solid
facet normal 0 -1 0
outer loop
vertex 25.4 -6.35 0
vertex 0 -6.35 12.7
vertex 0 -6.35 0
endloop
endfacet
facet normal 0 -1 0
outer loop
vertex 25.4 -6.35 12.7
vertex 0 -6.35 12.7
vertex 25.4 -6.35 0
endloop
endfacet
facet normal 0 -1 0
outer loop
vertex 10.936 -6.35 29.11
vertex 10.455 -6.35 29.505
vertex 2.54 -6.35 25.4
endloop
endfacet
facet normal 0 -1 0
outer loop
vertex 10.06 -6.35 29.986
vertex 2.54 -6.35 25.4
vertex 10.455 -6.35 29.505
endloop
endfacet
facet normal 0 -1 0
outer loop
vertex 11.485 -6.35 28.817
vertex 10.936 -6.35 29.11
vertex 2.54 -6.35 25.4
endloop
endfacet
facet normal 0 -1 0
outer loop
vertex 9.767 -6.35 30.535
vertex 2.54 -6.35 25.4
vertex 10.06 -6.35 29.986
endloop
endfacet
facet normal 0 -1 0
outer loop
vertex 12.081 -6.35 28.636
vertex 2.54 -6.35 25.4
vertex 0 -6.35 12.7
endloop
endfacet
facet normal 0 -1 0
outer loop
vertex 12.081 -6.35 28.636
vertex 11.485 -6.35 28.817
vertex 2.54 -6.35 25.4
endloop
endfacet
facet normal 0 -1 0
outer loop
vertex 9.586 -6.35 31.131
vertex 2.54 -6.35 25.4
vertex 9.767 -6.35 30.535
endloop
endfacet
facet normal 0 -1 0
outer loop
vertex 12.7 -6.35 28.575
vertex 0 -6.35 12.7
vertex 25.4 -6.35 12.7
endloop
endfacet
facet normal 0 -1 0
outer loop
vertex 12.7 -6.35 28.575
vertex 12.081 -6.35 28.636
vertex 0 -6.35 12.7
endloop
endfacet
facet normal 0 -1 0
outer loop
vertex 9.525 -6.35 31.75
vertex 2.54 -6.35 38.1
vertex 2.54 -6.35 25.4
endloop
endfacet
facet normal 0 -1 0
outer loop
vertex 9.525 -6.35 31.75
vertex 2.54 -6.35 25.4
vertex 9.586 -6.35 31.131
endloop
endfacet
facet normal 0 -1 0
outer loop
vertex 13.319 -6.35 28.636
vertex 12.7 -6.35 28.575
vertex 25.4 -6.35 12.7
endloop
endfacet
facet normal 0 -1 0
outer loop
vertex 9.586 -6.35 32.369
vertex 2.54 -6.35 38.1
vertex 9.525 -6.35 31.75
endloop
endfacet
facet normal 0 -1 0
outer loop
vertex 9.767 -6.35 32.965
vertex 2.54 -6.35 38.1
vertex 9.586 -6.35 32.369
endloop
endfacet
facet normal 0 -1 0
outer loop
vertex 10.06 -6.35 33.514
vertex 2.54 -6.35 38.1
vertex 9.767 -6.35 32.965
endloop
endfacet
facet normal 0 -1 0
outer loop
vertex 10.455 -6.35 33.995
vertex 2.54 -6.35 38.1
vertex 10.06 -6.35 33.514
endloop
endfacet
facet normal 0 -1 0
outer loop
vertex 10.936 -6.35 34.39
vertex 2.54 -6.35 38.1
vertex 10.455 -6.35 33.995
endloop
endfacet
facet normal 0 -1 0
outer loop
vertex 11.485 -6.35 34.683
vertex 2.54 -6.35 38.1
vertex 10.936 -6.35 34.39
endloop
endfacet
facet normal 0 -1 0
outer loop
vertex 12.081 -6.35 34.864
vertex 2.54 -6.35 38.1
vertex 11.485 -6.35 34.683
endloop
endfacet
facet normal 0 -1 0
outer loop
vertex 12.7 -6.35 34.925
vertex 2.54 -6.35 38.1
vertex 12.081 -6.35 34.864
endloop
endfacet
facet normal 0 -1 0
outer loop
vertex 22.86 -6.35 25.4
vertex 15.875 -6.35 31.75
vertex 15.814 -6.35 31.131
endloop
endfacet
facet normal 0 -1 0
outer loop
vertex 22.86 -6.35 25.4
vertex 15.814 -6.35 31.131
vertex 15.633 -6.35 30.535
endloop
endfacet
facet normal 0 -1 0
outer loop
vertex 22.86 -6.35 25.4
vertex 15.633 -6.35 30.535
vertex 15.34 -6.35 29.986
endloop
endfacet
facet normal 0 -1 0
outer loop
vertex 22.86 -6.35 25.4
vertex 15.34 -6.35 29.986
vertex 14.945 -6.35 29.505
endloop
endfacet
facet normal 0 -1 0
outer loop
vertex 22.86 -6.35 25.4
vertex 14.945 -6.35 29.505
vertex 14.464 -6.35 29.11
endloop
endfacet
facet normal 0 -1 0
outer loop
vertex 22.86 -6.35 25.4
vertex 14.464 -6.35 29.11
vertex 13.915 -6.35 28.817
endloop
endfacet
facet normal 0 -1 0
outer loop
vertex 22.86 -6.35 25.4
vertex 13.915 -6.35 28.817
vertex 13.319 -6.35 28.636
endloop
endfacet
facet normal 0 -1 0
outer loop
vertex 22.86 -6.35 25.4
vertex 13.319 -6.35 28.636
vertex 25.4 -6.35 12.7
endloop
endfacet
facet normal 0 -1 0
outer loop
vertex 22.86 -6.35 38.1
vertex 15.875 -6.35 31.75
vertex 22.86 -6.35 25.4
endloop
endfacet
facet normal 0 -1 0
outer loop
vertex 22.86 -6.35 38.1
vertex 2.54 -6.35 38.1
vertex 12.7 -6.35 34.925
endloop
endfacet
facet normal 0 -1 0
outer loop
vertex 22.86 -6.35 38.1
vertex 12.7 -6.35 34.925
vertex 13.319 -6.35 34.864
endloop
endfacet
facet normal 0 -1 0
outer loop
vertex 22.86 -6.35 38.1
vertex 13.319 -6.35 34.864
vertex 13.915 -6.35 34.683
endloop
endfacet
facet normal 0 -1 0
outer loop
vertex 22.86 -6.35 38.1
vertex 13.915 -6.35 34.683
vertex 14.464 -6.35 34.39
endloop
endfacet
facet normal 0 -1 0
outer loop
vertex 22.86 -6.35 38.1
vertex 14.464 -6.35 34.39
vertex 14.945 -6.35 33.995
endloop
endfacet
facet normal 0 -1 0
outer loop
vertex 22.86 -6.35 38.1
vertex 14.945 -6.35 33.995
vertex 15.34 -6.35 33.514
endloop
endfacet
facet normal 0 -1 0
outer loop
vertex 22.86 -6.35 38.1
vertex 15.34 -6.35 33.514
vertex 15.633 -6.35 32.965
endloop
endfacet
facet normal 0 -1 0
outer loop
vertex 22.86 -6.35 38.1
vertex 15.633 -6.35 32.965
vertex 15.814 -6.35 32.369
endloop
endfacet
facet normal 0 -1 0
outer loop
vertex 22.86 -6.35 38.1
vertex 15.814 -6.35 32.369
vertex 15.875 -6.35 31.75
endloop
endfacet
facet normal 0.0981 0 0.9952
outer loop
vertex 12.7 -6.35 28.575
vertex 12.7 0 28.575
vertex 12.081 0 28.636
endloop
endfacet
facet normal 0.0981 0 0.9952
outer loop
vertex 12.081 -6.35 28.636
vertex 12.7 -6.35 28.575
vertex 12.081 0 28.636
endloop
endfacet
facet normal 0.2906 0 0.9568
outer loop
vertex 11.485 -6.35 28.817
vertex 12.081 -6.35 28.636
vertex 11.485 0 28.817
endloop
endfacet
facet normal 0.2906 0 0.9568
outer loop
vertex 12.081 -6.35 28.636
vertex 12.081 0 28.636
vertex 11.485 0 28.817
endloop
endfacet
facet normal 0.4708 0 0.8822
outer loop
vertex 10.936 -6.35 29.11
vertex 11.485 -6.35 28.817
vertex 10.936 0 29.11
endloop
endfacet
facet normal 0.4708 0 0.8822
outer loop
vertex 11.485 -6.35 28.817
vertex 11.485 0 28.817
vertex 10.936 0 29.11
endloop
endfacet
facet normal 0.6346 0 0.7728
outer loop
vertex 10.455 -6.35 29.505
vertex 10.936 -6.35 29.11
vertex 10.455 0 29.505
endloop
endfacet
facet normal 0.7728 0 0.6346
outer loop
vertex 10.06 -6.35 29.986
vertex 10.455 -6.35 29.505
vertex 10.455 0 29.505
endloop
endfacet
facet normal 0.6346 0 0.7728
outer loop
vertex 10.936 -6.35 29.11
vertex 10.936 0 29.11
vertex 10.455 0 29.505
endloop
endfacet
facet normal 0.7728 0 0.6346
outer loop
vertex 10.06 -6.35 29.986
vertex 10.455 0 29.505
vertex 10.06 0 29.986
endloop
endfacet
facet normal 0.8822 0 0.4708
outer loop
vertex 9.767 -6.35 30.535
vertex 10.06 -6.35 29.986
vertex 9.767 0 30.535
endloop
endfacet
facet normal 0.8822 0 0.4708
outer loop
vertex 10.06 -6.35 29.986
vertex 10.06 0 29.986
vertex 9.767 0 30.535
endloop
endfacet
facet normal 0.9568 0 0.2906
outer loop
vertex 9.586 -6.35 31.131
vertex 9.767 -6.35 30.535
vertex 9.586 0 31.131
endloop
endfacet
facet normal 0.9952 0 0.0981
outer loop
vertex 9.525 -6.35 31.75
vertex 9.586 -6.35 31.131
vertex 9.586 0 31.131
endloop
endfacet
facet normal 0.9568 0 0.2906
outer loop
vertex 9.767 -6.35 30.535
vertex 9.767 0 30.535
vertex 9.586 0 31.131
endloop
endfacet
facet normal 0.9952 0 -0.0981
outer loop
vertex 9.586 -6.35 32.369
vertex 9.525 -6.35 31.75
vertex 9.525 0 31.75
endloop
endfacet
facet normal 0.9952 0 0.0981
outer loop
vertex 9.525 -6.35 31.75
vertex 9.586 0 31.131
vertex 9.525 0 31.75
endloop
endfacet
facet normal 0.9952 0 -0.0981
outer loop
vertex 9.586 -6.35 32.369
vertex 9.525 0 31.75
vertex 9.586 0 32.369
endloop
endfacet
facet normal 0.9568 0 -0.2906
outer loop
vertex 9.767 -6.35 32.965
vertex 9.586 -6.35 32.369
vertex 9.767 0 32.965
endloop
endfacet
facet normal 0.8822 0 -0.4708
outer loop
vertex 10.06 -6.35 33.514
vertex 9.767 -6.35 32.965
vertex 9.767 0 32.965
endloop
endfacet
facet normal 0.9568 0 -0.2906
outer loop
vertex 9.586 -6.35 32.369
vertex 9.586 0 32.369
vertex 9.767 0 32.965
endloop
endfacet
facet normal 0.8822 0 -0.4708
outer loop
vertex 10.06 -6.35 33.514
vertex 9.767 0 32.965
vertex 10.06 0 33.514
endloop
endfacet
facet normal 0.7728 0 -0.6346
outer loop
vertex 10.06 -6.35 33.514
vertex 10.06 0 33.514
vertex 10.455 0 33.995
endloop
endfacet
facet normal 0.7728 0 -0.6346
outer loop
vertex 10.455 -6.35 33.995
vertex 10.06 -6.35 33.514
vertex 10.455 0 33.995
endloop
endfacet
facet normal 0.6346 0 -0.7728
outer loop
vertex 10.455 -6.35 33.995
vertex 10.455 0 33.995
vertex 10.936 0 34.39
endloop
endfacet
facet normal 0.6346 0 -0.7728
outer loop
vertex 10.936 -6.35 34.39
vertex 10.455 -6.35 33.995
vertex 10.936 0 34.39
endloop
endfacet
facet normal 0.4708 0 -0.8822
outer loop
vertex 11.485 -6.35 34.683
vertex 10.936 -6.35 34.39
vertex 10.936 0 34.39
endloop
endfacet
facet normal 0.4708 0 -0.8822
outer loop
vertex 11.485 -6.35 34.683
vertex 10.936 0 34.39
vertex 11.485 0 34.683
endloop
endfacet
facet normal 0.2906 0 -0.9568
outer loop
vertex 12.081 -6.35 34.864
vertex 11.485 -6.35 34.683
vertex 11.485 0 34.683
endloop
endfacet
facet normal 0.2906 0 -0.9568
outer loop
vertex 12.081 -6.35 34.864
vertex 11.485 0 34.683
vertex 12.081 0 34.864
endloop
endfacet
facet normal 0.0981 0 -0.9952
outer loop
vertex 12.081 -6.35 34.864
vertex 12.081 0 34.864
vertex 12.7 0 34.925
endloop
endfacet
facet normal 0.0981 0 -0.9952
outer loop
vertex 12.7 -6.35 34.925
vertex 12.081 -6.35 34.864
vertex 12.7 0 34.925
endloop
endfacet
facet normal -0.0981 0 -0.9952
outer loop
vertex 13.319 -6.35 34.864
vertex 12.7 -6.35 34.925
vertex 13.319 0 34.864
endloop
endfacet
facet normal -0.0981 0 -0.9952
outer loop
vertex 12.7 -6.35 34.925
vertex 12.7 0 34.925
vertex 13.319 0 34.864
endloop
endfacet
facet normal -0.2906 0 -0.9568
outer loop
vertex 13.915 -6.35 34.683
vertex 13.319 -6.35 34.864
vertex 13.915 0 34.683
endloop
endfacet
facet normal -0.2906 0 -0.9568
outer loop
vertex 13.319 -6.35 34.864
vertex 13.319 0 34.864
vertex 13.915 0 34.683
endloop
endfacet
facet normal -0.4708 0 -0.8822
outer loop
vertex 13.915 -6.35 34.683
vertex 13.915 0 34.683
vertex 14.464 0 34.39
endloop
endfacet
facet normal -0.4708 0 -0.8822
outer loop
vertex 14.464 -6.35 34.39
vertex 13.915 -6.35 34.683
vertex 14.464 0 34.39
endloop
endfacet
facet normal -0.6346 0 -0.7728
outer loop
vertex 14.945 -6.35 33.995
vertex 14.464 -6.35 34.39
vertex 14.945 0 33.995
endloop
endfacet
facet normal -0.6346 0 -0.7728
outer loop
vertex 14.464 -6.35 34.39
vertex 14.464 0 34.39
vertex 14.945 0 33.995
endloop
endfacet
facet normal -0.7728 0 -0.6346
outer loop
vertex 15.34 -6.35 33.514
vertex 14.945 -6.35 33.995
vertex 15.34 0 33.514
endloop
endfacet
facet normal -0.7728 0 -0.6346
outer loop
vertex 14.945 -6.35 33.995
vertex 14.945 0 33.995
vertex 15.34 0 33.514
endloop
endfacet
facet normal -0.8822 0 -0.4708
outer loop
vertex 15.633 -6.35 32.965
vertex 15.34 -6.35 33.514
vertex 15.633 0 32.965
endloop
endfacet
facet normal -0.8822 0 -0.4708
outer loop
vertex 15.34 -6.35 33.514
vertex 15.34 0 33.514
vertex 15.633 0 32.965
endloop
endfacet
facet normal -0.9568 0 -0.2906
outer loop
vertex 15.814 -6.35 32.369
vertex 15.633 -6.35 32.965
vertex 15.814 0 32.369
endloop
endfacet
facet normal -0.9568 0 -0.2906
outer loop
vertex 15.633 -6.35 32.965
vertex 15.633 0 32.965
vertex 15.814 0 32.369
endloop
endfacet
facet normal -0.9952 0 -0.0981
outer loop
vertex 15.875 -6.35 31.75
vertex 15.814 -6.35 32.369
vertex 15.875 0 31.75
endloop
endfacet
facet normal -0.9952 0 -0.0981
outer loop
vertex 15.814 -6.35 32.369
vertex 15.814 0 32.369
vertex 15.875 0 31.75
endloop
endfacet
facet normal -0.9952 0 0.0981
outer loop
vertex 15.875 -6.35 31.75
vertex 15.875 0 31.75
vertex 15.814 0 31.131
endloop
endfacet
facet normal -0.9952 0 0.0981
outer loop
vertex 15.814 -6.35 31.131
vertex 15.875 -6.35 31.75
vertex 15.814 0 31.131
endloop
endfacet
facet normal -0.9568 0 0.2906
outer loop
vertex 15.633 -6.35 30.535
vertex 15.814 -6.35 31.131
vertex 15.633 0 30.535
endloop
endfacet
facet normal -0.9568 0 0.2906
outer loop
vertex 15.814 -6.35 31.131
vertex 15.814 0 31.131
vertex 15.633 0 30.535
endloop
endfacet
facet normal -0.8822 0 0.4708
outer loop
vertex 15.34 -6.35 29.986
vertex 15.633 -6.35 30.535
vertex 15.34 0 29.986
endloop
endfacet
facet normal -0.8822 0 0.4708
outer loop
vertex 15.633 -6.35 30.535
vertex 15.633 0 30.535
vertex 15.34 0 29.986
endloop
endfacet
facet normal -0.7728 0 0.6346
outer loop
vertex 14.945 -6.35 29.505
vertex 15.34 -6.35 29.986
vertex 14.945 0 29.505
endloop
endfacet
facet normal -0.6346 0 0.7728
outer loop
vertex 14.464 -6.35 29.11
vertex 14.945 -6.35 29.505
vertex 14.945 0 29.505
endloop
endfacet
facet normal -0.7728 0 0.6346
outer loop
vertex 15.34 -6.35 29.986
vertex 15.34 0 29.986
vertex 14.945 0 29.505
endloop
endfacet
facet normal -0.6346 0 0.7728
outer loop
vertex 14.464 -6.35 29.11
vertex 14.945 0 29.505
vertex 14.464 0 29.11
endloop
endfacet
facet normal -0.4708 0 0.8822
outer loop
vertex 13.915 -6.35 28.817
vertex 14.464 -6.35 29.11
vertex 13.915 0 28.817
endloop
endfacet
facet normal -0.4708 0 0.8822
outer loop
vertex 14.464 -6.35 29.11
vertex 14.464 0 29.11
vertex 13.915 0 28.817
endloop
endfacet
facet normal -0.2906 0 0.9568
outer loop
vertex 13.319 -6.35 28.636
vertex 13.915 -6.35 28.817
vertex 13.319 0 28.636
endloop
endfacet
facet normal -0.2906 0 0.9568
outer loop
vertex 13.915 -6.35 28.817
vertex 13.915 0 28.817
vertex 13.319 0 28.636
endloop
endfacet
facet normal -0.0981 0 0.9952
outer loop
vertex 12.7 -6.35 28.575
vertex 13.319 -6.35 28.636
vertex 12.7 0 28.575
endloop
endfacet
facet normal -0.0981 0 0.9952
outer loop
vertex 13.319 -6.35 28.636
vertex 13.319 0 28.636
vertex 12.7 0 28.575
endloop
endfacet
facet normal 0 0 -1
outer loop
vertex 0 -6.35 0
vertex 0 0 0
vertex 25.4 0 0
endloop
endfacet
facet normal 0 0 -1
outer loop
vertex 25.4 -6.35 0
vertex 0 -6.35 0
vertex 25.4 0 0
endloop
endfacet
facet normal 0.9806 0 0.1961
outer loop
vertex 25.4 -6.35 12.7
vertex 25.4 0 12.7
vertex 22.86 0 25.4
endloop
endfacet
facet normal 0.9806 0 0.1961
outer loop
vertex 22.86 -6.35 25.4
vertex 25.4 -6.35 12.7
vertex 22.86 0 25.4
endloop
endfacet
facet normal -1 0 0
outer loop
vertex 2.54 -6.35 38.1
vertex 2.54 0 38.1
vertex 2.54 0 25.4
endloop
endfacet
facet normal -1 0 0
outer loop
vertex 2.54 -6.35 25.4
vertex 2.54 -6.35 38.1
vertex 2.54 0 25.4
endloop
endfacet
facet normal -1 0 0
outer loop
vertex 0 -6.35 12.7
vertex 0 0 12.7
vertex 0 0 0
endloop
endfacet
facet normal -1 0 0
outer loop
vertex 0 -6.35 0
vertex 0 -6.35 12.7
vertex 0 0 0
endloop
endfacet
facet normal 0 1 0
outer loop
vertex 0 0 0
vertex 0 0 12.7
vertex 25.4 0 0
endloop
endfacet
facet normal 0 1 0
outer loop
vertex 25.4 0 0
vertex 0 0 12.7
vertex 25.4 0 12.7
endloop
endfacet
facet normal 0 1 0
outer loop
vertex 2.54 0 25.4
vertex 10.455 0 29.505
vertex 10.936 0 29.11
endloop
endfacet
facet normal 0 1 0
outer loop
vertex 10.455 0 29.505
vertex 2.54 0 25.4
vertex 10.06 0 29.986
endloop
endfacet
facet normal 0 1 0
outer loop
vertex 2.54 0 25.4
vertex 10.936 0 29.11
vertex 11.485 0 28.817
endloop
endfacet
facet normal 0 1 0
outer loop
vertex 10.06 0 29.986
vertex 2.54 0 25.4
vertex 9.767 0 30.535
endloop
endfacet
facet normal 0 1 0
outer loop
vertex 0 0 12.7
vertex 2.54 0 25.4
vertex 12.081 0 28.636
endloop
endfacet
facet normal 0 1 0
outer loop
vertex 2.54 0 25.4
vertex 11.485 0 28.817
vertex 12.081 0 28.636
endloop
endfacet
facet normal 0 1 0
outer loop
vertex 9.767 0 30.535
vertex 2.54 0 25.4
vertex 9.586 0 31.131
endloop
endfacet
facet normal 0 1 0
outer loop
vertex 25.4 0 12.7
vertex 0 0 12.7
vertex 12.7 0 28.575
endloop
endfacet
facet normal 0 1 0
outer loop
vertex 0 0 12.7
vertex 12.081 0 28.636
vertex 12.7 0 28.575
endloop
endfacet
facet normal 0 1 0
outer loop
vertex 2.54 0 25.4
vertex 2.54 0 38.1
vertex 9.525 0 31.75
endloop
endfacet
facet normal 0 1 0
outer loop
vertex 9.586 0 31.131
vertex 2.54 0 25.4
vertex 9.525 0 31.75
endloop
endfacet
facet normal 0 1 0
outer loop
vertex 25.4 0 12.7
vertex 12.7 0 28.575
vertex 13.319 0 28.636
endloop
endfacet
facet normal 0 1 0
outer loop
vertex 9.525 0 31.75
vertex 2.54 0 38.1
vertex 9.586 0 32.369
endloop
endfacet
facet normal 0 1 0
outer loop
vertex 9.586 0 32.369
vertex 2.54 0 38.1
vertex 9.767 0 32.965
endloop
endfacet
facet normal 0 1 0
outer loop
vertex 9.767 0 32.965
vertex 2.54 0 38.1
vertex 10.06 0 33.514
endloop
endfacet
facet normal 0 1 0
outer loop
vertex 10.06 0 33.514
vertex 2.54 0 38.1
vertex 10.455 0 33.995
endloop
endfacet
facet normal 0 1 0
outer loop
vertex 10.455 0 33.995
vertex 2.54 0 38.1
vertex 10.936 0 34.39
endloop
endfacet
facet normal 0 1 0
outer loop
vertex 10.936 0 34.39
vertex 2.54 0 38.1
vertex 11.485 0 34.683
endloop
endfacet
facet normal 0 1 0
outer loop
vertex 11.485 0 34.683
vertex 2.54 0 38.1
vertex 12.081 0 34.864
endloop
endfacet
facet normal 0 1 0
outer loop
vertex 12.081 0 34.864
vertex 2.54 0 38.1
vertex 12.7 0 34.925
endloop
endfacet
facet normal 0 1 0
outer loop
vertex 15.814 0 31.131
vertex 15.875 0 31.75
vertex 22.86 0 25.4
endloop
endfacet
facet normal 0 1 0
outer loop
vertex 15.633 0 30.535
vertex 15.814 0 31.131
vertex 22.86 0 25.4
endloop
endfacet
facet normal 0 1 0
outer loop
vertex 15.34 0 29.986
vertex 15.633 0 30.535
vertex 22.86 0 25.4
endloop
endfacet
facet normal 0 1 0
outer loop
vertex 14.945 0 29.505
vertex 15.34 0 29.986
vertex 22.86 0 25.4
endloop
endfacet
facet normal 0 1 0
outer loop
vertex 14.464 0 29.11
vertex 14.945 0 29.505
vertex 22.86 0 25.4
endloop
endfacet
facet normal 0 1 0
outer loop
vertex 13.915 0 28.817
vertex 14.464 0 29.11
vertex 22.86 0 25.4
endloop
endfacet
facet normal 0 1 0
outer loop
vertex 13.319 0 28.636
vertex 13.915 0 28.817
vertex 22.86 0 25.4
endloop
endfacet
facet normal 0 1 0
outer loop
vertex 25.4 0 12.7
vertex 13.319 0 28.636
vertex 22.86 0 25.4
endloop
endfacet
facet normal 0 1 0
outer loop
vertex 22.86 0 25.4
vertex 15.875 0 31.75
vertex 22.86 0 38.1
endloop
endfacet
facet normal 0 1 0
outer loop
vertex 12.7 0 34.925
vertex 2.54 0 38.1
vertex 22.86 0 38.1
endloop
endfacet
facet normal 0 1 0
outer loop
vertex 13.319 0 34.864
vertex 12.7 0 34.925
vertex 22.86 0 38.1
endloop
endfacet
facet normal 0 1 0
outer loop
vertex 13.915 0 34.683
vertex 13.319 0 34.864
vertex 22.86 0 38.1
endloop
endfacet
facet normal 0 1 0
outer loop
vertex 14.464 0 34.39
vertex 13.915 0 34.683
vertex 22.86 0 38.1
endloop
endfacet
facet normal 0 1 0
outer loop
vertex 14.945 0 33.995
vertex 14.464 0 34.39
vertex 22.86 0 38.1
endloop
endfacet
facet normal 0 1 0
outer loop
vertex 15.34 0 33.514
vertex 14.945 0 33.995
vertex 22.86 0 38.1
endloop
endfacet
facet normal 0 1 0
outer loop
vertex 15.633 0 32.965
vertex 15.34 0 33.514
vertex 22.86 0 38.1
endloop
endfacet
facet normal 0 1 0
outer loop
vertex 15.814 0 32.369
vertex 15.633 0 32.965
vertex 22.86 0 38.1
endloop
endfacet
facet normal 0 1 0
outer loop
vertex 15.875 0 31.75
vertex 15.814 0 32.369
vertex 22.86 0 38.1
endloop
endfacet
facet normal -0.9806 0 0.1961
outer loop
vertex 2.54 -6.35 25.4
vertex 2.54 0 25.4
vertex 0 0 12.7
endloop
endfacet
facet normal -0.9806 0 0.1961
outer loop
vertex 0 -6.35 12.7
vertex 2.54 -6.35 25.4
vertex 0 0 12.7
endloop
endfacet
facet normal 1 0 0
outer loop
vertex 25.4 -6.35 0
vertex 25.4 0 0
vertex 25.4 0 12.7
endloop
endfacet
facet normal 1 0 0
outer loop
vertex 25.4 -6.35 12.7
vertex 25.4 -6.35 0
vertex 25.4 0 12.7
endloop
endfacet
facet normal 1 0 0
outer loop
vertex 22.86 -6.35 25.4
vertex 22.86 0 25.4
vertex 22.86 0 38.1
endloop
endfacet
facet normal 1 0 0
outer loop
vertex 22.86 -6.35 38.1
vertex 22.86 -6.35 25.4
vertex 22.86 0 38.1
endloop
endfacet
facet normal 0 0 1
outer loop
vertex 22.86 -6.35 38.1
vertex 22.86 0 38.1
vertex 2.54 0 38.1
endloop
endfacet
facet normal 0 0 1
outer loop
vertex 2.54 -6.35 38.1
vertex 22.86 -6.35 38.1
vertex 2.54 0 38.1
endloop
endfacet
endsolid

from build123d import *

# Parameters (mm, degrees)
F1_DEPTH = 6.35


with BuildPart() as f1:
    # F0 (on Front) → F1 (new body)
    with BuildSketch(Plane.XZ):
        with BuildLine():
            ThreePointArc((15.875, 31.75), (10.454936, 33.995064), (12.7, 28.575))
            ThreePointArc((12.7, 28.575), (14.945064, 29.504936), (15.875, 31.75))
        make_face()
        Polygon((0, 12.7), (0, 0), (12.7, 0), (25.4, 0), (25.4, 12.7), (22.86, 25.4), (22.86, 38.1), (2.54, 38.1), (2.54, 25.4), align=None)
        with BuildLine():
            ThreePointArc((15.875, 31.75), (14.945064, 29.504936), (12.7, 28.575))
            ThreePointArc((12.7, 28.575), (10.454936, 33.995064), (15.875, 31.75))
        make_face(mode=Mode.SUBTRACT)
    extrude(amount=F1_DEPTH)


solid = f1.part
